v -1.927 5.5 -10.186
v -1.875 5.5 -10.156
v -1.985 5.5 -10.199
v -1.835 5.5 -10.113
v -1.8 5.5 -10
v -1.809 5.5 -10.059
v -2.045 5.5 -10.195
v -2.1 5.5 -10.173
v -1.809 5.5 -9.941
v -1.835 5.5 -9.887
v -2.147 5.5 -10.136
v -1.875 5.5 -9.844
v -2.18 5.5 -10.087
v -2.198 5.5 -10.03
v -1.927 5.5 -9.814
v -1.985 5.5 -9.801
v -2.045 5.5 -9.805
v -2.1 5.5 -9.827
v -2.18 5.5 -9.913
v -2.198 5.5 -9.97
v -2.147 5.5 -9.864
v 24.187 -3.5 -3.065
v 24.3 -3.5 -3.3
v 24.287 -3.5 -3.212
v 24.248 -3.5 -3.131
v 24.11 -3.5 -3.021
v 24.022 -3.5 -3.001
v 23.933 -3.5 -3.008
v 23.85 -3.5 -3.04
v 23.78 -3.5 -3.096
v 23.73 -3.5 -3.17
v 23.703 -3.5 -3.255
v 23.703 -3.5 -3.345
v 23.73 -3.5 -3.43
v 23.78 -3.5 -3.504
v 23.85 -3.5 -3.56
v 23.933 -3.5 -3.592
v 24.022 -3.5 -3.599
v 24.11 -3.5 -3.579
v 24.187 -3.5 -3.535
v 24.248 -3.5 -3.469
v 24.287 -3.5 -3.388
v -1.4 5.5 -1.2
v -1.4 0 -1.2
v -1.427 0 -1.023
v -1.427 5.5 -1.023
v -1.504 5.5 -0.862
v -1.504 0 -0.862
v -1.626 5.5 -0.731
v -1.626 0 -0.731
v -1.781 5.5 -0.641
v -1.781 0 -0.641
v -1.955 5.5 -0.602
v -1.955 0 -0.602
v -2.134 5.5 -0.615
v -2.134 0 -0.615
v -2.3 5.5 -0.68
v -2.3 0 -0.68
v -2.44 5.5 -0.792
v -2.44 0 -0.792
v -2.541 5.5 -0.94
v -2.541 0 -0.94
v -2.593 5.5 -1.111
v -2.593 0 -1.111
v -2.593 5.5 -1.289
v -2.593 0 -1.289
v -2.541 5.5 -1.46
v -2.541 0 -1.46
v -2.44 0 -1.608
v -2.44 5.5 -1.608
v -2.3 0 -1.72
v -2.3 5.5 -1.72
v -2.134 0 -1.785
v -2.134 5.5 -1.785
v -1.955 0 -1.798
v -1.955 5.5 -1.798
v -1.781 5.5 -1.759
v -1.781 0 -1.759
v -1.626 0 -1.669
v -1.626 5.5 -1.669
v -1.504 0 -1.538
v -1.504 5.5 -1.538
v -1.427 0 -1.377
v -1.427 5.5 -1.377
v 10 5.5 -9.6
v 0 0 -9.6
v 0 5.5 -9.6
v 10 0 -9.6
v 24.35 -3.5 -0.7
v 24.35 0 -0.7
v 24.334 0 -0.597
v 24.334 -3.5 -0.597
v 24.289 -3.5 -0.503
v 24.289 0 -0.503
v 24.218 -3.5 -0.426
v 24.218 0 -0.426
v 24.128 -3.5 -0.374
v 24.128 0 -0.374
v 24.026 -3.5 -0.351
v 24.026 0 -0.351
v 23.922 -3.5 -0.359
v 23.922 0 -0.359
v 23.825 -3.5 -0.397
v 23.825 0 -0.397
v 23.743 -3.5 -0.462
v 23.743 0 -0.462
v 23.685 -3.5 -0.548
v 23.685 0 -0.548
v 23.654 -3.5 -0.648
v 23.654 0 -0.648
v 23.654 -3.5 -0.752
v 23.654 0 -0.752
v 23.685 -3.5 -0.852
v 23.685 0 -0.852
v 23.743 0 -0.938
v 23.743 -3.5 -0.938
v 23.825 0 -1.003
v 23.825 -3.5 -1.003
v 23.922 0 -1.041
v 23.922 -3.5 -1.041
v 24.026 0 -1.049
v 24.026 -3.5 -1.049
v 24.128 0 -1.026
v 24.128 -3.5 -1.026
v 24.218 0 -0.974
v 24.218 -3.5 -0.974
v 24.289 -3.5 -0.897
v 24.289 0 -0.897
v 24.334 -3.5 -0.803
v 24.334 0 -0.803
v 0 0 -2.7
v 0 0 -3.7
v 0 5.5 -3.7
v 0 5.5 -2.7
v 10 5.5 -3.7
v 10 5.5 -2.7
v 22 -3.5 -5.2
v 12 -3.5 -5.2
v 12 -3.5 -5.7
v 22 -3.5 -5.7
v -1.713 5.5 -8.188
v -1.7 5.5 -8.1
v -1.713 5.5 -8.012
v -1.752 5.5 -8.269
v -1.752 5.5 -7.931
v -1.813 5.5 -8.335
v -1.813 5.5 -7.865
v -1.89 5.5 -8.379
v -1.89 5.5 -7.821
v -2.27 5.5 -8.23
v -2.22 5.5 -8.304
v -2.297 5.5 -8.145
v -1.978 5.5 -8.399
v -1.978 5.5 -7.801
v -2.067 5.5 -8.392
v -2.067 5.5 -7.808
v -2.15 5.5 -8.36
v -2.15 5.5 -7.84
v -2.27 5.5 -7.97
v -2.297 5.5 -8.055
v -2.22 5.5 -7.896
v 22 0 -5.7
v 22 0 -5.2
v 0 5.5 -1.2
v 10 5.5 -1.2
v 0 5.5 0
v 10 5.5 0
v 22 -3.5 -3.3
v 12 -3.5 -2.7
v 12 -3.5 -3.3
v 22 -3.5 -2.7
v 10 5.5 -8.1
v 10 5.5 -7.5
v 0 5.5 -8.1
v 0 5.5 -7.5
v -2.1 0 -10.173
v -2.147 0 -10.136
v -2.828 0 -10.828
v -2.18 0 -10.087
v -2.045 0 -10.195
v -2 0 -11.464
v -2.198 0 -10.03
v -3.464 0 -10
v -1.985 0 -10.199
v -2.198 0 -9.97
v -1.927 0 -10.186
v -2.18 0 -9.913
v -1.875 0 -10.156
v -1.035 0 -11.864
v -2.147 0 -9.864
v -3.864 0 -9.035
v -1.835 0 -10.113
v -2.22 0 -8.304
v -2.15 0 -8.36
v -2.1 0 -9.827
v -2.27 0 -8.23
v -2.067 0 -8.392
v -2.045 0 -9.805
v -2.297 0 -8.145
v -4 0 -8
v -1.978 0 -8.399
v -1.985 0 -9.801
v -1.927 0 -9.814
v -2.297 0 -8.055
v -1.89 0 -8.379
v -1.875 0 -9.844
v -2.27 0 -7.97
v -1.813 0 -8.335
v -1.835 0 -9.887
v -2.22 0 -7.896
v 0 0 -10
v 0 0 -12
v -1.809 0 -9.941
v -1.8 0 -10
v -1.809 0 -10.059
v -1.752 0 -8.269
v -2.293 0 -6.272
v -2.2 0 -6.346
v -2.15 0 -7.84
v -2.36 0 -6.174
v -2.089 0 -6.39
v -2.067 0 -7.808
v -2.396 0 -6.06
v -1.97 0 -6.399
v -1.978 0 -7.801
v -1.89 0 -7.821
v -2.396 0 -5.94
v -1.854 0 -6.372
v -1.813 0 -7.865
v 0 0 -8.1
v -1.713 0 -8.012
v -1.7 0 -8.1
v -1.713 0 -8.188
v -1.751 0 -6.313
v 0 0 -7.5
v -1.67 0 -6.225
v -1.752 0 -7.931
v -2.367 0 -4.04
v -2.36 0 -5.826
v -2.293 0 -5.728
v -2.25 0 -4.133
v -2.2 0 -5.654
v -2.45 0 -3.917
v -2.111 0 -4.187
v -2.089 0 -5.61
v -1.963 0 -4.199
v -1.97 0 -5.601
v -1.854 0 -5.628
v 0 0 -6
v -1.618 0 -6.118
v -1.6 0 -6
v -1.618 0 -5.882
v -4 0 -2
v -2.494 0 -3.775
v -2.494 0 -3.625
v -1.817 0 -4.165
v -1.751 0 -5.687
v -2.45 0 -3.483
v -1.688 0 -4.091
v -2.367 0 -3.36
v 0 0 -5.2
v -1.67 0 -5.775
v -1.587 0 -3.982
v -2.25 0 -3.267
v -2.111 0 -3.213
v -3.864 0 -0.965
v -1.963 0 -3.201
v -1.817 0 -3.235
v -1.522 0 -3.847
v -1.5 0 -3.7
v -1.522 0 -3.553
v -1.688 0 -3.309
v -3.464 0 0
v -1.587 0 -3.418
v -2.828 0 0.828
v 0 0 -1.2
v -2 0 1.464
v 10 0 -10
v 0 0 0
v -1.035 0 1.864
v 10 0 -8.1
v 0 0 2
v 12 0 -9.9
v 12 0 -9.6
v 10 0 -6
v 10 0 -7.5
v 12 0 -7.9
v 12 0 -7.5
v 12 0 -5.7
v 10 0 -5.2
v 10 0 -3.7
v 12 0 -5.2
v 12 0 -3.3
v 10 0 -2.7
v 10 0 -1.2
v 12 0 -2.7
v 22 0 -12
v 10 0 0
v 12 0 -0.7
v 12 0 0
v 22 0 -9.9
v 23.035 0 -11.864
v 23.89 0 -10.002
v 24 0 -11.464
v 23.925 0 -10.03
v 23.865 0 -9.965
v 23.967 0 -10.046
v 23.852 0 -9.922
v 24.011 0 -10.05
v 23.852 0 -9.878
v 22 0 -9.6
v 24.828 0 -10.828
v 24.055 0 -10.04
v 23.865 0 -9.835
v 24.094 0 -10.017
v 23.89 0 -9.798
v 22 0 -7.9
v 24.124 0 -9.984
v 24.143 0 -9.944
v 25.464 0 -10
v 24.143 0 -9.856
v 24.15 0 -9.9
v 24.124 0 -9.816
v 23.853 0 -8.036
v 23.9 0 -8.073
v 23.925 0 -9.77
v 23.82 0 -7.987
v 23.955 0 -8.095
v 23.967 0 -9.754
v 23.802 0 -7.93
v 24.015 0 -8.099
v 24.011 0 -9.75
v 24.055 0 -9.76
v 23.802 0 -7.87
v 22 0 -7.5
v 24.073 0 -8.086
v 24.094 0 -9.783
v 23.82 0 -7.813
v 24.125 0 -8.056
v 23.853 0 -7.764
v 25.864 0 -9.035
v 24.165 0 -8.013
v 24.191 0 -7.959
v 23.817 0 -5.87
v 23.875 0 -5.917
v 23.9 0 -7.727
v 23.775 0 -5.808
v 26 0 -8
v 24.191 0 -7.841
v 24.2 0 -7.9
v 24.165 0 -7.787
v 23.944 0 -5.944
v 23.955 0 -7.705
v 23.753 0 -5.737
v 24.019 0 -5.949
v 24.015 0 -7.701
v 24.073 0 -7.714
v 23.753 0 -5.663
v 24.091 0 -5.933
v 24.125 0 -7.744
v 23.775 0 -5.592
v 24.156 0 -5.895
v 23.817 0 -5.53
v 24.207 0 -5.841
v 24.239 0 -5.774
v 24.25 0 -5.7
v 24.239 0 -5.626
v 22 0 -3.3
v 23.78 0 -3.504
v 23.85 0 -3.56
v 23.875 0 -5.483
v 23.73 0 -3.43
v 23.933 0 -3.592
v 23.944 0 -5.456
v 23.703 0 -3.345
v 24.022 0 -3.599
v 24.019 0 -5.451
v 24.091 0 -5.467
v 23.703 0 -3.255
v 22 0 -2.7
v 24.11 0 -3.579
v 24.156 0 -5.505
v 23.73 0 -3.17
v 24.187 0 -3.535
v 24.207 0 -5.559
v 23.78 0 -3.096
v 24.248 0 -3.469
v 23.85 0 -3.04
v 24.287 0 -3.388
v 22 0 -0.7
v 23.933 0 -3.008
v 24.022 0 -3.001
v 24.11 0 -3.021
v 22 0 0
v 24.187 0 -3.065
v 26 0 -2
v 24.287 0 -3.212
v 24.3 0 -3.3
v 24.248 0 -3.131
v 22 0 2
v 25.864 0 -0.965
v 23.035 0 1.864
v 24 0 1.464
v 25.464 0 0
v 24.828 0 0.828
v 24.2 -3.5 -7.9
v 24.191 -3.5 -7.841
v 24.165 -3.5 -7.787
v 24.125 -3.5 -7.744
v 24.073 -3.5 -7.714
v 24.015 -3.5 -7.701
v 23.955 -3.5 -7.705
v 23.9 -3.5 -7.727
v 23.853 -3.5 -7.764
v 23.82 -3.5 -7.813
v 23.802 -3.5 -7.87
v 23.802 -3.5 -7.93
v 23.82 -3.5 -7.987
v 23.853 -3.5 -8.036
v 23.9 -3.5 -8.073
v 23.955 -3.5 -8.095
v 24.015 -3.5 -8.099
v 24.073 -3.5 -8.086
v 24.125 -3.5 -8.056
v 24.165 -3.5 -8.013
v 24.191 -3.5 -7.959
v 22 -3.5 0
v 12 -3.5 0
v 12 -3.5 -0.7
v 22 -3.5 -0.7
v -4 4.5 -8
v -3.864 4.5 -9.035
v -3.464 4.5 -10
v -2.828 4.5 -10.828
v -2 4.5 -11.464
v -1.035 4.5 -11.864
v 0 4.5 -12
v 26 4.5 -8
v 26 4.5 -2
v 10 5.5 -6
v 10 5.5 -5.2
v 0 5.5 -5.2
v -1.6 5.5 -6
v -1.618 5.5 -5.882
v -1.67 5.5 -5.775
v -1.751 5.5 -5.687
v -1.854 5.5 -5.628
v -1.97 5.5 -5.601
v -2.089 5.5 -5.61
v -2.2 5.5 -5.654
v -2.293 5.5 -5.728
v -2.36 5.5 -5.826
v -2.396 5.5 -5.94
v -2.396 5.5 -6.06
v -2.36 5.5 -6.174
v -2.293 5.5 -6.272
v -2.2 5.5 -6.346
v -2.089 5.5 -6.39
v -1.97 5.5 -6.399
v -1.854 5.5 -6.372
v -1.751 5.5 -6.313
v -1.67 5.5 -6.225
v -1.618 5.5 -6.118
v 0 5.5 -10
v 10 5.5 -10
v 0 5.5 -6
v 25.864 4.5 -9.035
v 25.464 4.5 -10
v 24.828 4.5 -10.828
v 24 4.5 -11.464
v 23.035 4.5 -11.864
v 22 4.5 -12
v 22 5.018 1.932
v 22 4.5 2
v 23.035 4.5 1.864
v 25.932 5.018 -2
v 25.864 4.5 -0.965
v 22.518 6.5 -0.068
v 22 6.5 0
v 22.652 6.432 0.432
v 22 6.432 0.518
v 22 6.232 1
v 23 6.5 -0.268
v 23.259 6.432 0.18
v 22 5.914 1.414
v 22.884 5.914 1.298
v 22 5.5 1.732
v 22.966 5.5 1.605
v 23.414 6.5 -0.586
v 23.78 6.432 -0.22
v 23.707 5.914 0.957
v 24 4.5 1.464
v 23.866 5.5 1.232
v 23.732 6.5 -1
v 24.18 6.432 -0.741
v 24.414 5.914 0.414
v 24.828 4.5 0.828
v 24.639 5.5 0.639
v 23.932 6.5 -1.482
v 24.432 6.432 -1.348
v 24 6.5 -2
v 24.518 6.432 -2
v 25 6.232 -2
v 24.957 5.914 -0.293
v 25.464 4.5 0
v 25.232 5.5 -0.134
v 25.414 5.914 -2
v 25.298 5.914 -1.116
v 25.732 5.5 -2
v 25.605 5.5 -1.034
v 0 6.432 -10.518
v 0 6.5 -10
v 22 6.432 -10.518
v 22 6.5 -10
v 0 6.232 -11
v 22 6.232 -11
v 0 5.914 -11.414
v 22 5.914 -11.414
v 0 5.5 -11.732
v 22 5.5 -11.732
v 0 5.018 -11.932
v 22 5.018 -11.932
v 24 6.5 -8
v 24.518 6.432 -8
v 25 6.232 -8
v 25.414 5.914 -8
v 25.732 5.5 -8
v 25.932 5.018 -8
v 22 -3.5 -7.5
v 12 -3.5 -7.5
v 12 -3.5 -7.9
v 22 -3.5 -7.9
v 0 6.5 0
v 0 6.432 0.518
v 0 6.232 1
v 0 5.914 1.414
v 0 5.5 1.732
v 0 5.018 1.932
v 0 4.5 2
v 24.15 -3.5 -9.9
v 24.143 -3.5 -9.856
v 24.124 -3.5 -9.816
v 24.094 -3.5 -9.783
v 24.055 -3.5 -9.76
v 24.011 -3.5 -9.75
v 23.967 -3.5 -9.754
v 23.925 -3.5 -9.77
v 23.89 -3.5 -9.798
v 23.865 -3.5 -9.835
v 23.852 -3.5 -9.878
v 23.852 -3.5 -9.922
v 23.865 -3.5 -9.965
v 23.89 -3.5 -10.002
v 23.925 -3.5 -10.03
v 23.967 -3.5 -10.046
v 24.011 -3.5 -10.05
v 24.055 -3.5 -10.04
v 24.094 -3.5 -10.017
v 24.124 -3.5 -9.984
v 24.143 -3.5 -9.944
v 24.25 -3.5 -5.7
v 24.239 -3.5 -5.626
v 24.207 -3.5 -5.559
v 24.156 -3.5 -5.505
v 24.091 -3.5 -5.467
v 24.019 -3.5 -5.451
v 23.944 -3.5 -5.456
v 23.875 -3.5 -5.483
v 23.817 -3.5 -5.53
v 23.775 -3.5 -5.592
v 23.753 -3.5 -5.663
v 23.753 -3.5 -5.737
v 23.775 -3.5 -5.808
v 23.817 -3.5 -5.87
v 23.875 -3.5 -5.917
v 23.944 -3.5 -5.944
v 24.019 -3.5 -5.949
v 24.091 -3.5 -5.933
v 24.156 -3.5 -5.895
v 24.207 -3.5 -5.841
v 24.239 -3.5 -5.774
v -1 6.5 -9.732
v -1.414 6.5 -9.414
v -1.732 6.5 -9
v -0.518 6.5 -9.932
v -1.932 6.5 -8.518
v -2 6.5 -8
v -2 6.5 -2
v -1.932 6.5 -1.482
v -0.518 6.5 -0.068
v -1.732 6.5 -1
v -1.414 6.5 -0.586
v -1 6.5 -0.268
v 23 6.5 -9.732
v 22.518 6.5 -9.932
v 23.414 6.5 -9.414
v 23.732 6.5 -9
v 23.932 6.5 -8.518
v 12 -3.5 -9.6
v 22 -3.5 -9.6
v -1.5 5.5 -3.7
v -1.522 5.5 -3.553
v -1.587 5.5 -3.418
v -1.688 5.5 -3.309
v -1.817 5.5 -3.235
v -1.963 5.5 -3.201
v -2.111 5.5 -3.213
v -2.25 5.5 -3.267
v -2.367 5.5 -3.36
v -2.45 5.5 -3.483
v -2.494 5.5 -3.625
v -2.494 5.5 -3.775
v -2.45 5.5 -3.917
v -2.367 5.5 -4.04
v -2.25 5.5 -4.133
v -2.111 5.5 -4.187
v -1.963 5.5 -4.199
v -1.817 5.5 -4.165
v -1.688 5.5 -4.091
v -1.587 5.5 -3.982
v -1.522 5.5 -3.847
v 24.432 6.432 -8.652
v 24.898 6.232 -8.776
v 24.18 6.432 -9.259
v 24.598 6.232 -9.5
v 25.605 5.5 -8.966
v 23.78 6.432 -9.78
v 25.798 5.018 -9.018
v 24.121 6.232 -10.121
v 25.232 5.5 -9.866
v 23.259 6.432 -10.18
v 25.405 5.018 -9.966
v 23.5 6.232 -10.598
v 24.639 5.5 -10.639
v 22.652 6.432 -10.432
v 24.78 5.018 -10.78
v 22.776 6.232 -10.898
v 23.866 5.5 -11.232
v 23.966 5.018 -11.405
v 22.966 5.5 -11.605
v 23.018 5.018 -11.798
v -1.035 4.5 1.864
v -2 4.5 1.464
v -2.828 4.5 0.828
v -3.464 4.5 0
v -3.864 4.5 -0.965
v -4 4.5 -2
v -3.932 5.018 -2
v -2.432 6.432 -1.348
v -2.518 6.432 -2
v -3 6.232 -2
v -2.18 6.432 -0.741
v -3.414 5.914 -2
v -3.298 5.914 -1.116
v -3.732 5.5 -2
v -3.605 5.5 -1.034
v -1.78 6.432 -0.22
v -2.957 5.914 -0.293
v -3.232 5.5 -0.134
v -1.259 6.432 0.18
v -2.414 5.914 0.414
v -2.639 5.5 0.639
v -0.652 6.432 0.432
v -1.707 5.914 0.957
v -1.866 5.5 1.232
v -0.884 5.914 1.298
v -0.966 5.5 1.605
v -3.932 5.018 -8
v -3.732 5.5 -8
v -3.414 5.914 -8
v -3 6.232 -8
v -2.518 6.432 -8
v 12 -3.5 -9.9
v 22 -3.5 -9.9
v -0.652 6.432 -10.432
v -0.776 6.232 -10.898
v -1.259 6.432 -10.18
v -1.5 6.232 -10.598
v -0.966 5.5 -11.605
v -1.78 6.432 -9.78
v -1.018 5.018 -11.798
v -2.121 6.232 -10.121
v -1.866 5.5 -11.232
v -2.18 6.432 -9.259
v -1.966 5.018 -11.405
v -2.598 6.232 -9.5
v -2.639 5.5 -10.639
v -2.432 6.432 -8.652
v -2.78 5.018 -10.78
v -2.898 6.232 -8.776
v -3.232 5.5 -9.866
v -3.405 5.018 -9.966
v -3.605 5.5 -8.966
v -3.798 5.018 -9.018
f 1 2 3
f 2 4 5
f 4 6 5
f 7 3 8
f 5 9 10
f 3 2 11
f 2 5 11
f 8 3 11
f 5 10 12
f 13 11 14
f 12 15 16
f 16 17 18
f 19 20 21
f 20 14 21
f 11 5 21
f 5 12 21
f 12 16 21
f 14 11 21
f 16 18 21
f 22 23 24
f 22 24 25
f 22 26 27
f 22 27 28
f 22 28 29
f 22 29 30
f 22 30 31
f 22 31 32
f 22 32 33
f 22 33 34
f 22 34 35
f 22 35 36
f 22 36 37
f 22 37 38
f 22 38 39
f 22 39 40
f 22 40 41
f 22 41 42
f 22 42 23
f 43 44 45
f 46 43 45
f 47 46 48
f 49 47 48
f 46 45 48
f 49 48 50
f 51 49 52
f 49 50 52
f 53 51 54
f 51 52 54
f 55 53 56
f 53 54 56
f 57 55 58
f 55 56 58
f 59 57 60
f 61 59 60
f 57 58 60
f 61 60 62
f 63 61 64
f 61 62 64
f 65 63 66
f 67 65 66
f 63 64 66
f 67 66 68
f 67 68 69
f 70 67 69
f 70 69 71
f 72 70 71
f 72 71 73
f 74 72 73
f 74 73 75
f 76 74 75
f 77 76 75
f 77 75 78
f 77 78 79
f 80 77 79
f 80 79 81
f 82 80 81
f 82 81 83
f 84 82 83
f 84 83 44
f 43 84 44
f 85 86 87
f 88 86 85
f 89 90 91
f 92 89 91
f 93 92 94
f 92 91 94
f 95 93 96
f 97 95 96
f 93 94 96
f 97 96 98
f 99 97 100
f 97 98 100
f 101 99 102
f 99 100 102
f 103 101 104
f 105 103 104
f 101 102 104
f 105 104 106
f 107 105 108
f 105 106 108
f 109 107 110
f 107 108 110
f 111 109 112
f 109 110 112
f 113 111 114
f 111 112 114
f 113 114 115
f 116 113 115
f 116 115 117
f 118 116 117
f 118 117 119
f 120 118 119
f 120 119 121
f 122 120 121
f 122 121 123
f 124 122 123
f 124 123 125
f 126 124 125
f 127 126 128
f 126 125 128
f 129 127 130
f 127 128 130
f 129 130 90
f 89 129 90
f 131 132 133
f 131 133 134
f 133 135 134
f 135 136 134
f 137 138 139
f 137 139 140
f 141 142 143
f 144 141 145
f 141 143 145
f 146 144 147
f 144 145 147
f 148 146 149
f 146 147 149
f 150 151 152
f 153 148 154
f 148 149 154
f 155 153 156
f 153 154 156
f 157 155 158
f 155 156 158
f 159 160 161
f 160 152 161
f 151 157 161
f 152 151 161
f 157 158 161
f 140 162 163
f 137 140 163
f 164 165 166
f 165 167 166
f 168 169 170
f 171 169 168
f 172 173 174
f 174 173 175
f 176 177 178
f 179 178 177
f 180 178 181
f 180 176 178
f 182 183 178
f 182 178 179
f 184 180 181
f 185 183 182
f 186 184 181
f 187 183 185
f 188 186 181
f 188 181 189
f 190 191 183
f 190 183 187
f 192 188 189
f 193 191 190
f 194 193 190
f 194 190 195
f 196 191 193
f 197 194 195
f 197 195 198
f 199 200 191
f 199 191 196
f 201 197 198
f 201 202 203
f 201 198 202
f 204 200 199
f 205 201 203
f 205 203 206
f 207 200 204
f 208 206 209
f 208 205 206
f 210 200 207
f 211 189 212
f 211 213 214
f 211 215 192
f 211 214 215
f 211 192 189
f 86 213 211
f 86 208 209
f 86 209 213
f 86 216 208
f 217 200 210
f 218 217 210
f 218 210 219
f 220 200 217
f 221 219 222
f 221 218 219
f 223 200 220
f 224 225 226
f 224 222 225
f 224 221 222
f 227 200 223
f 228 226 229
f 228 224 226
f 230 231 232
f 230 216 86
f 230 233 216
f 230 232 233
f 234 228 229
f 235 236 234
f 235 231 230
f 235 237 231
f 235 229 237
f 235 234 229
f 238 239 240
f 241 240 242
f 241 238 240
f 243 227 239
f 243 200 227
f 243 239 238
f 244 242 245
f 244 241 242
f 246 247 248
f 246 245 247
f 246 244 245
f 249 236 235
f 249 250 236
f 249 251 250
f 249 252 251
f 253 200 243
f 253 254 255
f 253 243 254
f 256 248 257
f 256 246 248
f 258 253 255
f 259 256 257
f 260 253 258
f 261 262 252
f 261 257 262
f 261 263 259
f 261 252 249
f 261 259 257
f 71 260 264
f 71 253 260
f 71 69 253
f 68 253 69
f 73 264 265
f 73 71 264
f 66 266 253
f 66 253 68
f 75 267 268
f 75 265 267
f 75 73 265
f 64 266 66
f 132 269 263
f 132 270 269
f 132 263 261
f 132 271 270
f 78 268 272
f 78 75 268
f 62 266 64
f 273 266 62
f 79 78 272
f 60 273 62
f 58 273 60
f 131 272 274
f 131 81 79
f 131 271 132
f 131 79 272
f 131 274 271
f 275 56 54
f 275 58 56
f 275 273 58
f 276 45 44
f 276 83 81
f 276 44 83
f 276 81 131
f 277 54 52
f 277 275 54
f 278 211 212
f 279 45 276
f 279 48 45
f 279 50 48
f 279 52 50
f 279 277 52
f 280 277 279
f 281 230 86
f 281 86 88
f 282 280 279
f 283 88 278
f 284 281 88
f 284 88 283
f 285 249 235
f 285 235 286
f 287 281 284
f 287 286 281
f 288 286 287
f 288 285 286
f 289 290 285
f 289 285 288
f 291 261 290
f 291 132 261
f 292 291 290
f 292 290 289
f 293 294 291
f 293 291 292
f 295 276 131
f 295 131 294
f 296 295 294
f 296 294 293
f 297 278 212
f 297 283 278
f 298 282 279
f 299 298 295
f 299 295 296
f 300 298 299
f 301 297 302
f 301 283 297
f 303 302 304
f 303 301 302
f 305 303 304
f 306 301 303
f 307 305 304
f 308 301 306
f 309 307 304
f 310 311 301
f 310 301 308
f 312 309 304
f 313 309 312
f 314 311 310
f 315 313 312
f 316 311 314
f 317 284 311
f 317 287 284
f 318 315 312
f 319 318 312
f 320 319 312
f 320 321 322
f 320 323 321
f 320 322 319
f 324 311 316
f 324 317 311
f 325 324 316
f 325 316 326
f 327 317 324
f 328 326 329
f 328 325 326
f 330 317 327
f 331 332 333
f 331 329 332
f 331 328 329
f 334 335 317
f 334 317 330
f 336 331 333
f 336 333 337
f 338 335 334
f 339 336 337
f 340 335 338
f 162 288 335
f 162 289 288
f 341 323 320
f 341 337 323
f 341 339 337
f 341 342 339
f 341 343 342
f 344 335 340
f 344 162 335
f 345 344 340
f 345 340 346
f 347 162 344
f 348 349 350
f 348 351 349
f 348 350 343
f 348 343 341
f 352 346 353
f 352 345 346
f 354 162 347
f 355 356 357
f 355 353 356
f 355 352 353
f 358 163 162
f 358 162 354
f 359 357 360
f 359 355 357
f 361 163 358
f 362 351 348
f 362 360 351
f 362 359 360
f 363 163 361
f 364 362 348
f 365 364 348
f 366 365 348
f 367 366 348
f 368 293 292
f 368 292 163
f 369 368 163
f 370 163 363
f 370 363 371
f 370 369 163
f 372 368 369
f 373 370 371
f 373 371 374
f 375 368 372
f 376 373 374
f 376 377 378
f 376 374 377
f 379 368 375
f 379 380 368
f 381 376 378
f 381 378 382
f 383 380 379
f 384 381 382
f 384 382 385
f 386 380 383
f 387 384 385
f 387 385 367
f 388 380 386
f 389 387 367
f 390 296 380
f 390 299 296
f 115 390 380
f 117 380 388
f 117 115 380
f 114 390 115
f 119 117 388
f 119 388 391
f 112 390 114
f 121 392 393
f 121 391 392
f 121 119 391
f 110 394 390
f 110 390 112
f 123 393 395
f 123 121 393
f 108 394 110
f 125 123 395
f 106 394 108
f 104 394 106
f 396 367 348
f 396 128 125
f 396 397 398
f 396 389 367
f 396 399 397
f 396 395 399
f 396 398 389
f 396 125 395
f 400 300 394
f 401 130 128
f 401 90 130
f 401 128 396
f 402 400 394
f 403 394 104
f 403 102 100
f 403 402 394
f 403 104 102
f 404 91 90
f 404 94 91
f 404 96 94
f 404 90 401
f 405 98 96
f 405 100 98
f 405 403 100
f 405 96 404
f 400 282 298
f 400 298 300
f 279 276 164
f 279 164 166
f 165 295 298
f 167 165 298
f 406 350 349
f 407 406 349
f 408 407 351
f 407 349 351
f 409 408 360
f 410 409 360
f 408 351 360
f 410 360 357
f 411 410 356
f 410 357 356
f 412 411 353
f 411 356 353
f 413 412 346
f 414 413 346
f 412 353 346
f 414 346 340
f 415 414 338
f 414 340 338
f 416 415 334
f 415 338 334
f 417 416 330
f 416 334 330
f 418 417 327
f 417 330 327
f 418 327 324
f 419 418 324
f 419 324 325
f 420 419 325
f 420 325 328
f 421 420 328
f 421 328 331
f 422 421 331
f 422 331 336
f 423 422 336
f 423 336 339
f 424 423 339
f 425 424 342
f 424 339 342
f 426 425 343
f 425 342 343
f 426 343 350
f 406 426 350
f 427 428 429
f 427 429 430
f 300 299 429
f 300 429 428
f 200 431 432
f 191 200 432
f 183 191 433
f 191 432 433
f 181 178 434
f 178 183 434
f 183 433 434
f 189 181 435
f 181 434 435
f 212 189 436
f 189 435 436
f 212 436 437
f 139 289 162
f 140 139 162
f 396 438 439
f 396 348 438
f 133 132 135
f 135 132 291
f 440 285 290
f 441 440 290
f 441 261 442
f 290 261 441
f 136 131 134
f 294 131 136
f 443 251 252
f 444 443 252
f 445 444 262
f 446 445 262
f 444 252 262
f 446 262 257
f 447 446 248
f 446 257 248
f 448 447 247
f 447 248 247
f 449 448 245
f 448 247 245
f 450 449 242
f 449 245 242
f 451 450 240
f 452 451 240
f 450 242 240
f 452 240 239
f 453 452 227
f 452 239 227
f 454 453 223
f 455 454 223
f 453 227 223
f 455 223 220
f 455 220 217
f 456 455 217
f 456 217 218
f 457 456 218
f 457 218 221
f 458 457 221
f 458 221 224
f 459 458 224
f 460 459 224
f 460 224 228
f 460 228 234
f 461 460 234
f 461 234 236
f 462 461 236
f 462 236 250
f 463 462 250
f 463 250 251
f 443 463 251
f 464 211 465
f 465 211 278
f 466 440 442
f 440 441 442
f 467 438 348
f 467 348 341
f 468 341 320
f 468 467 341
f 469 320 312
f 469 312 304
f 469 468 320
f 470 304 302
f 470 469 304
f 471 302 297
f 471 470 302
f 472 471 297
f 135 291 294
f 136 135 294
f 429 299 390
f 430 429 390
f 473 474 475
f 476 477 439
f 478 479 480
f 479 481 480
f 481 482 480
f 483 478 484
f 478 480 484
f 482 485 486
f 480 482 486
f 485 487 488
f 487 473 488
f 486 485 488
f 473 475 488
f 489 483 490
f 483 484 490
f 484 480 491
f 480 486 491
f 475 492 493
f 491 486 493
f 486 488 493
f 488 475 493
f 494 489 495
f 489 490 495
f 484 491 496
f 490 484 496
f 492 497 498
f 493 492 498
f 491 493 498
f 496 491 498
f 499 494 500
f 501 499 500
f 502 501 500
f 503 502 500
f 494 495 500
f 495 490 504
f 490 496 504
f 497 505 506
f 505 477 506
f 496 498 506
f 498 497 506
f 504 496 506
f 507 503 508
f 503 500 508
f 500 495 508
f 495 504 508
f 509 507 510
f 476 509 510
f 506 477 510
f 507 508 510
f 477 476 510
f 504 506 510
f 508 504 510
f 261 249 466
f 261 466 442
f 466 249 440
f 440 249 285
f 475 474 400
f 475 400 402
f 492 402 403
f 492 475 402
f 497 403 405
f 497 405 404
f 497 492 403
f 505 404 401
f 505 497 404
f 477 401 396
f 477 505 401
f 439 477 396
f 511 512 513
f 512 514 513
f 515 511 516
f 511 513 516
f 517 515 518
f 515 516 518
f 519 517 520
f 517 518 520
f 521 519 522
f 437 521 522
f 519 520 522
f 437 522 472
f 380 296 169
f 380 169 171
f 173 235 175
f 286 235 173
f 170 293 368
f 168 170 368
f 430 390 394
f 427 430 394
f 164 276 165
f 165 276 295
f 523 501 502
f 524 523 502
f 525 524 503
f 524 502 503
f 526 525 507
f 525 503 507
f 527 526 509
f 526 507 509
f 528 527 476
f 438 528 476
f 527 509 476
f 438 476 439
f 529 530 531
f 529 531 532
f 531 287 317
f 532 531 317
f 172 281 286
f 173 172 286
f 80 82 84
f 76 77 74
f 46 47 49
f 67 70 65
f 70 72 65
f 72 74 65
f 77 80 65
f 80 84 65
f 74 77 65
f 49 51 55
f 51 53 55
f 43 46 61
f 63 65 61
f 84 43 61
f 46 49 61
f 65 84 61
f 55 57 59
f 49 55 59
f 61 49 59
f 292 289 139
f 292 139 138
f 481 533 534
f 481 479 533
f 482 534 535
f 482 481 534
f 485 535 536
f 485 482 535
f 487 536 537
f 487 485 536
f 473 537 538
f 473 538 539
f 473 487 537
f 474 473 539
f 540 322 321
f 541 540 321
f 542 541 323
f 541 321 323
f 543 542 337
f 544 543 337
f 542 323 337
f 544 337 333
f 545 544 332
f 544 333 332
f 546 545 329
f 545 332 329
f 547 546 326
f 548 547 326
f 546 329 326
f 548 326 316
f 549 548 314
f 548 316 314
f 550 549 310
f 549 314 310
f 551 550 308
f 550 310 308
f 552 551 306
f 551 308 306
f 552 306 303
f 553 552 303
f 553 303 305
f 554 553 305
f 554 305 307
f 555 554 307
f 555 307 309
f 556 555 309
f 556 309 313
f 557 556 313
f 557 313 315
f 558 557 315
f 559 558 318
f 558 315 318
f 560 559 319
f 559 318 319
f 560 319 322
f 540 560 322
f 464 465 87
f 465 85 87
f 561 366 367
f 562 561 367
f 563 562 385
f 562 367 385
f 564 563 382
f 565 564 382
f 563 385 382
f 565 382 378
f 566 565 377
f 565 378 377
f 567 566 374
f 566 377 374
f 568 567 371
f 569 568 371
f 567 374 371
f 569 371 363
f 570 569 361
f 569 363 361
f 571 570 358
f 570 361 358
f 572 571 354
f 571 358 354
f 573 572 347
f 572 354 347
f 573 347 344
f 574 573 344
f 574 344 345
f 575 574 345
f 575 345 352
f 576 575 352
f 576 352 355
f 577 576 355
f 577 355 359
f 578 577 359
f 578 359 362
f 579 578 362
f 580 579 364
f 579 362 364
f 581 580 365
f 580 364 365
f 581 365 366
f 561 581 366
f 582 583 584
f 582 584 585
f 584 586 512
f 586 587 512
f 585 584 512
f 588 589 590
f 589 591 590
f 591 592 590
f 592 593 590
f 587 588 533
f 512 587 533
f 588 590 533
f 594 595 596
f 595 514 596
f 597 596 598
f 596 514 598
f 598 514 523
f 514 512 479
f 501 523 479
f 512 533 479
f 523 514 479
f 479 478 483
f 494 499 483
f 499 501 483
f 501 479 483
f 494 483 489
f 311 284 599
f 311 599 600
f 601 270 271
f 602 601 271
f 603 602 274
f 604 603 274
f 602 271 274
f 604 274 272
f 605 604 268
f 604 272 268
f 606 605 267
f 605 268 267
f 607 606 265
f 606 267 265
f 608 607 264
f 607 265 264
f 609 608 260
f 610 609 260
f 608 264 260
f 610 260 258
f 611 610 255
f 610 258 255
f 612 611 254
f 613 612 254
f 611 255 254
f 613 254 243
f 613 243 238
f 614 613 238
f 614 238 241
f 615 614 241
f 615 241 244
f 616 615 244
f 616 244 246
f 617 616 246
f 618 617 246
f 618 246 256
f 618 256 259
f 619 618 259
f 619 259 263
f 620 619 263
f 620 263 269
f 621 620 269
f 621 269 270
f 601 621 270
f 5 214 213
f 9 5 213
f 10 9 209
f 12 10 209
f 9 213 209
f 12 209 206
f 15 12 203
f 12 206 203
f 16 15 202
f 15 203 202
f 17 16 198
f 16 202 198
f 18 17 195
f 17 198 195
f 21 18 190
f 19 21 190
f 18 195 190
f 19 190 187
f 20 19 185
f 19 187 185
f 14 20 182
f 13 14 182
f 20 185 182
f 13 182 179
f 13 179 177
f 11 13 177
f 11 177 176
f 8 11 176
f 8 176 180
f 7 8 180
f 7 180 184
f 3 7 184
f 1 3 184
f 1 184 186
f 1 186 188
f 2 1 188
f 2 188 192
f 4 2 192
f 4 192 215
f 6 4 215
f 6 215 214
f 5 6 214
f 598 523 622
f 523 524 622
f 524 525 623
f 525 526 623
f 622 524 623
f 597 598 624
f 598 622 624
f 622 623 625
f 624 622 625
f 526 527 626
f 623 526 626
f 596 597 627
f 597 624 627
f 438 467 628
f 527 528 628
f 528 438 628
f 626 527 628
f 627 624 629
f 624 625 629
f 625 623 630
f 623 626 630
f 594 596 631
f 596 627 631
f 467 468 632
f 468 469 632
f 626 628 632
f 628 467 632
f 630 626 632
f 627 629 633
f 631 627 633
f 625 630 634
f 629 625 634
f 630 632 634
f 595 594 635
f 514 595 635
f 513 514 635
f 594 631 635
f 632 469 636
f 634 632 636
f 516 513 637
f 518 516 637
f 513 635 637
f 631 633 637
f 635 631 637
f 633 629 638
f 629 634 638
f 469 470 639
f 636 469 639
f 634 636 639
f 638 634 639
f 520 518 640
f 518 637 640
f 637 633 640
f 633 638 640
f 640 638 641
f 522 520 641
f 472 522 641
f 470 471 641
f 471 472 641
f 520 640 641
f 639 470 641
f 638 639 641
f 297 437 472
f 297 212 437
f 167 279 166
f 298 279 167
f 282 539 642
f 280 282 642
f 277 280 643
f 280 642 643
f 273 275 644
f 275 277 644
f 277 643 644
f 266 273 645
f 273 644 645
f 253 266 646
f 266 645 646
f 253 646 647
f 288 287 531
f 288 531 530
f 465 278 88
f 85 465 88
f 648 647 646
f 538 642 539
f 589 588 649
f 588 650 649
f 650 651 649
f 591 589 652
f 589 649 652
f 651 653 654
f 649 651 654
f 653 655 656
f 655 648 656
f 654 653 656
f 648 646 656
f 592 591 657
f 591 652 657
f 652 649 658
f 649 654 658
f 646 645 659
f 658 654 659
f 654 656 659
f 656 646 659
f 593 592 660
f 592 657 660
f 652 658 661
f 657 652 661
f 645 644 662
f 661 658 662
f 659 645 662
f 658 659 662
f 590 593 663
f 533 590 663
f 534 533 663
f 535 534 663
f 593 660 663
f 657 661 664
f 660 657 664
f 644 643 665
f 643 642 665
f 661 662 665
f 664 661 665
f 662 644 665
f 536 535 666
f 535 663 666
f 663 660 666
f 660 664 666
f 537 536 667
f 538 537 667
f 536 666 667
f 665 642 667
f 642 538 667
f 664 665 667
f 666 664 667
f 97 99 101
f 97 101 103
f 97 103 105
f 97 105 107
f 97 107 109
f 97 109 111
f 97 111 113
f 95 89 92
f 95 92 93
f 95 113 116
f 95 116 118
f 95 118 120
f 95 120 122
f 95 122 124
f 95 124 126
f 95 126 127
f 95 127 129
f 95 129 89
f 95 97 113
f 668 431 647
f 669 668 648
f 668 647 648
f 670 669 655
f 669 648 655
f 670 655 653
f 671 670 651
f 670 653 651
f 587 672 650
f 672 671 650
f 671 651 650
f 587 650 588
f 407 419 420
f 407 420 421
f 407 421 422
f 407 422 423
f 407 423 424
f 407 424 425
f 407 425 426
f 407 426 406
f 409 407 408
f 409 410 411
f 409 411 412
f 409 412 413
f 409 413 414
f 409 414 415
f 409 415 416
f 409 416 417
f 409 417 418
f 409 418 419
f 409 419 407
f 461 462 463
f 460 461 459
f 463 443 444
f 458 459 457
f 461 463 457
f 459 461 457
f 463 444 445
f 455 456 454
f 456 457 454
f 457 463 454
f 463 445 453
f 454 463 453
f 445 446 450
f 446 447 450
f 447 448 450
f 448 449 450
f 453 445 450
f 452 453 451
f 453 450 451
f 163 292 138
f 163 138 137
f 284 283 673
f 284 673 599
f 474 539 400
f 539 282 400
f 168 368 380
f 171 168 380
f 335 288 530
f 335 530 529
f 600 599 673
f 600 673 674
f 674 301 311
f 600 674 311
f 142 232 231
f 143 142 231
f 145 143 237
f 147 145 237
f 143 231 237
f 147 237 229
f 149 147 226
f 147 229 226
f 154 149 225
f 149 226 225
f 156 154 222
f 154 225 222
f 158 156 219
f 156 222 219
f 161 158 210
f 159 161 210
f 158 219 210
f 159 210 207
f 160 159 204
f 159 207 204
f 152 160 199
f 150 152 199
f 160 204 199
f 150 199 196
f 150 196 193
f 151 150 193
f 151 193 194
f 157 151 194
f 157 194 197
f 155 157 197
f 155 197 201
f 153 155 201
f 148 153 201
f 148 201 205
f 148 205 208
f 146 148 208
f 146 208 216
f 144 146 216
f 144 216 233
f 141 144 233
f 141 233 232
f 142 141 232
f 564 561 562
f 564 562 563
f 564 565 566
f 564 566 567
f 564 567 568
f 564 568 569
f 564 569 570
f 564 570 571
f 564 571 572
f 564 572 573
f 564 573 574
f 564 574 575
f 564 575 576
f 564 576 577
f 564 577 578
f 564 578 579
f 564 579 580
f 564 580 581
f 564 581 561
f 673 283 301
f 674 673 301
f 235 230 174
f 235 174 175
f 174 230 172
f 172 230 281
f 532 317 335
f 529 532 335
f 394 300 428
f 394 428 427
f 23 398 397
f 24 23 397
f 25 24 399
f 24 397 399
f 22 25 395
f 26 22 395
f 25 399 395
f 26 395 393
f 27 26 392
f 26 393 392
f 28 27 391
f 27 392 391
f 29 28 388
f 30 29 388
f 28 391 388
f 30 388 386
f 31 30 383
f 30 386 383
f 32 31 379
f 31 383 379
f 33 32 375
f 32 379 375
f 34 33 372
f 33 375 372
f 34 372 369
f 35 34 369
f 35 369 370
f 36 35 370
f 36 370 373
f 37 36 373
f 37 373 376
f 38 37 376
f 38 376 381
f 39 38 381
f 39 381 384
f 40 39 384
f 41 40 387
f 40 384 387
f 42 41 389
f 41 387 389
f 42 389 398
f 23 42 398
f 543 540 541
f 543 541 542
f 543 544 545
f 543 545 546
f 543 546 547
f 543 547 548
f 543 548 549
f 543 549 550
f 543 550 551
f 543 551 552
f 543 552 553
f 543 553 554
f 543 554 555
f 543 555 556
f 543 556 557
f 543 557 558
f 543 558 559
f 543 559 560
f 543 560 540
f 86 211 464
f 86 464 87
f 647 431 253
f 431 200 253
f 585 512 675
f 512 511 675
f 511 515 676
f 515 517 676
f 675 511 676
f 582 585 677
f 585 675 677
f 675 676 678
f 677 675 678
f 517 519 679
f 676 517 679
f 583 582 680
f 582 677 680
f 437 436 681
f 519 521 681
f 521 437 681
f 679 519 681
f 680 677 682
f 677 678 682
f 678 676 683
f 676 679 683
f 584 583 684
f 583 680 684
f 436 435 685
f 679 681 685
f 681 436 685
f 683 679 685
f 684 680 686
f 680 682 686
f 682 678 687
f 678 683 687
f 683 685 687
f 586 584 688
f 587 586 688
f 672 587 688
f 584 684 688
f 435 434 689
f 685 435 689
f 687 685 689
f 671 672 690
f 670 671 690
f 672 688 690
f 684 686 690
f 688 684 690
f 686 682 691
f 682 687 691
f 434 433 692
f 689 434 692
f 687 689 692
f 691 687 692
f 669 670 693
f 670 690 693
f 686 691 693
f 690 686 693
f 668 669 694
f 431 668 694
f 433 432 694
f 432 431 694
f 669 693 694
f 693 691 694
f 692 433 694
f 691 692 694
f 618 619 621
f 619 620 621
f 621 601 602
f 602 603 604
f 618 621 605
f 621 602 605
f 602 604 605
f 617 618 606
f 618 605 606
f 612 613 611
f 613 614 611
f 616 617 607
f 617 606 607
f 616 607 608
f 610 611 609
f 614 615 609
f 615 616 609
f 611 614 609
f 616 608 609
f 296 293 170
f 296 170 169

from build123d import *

# Parameters (mm, degrees)
F0_W         = 30
F0_H         = 14
F0_R         = 0.2
F0_W_2       = 10
F0_H_2       = 0.4
F0_R_2       = 0.3
F0_R_3       = 0.4
F0_H_3       = 0.6
F0_H_4       = 0.8
F0_H_5       = 0.3
F0_R_4       = 0.15
F0_H_6       = 0.5
F0_R_5       = 0.25
F0_R_6       = 0.5
F0_H_7       = 1
F0_R_7       = 0.6
F0_H_8       = 1.2
F0_H_9       = 0.7
F0_R_8       = 0.35
F1_DEPTH     = 6.5
F2_DEPTH     = 3.5
F3_W         = 30
F3_H         = 14
F4_DEPTH     = 1
F5_R         = 2
F6_T1_DEPTH  = 16.5
F6_T4_ANGLE  = 90
F6_T6_ANGLE  = 90
F6_T8_ANGLE  = 90
F6_T10_ANGLE = 90


# Not quite as in the source:
# - a fillet or chamfer that OpenCascade refuses, or shapes differently, is made with other operations: its cross-section is extruded or revolved along the edge and cut away or added


with BuildPart() as f1:
    # F0 (on Front) → F1 (new body)
    with BuildSketch(Plane.XZ):
        with Locations((11, -5)):
            Rectangle(F0_W, F0_H)
        with Locations((-2, -10)):
            Circle(F0_R, mode=Mode.SUBTRACT)
        with Locations((5, -9.8)):
            Rectangle(F0_W_2, F0_H_2, mode=Mode.SUBTRACT)
        with Locations((-2, -8.1)):
            Circle(F0_R_2, mode=Mode.SUBTRACT)
        with Locations((-2, -6)):
            Circle(F0_R_3, mode=Mode.SUBTRACT)
        with Locations((5, -7.8)):
            Rectangle(F0_W_2, F0_H_3, mode=Mode.SUBTRACT)
        with Locations((5, -5.6)):
            Rectangle(F0_W_2, F0_H_4, mode=Mode.SUBTRACT)
        with Locations((17, -9.75)):
            Rectangle(F0_W_2, F0_H_5, mode=Mode.SUBTRACT)
        with Locations((24, -9.9)):
            Circle(F0_R_4, mode=Mode.SUBTRACT)
        with Locations((17, -7.7)):
            Rectangle(F0_W_2, F0_H_2, mode=Mode.SUBTRACT)
        with Locations((17, -5.45)):
            Rectangle(F0_W_2, F0_H_6, mode=Mode.SUBTRACT)
        with Locations((24, -7.9)):
            Circle(F0_R, mode=Mode.SUBTRACT)
        with Locations((24, -5.7)):
            Circle(F0_R_5, mode=Mode.SUBTRACT)
        with Locations((-2, -3.7)):
            Circle(F0_R_6, mode=Mode.SUBTRACT)
        with Locations((5, -3.2)):
            Rectangle(F0_W_2, F0_H_7, mode=Mode.SUBTRACT)
        with Locations((-2, -1.2)):
            Circle(F0_R_7, mode=Mode.SUBTRACT)
        with Locations((5, -0.6)):
            Rectangle(F0_W_2, F0_H_8, mode=Mode.SUBTRACT)
        with Locations((17, -3)):
            Rectangle(F0_W_2, F0_H_3, mode=Mode.SUBTRACT)
        with Locations((24, -3.3)):
            Circle(F0_R_2, mode=Mode.SUBTRACT)
        with Locations((17, -0.35)):
            Rectangle(F0_W_2, F0_H_9, mode=Mode.SUBTRACT)
        with Locations((24, -0.7)):
            Circle(F0_R_8, mode=Mode.SUBTRACT)
        with Locations((17, -0.35)):
            Rectangle(F0_W_2, F0_H_9)
        with Locations((17, -3)):
            Rectangle(F0_W_2, F0_H_3)
        with Locations((17, -5.45)):
            Rectangle(F0_W_2, F0_H_6)
        with Locations((17, -7.7)):
            Rectangle(F0_W_2, F0_H_2)
        with Locations((17, -9.75)):
            Rectangle(F0_W_2, F0_H_5)
        with Locations((24, -0.7)):
            Circle(F0_R_8)
        with Locations((24, -3.3)):
            Circle(F0_R_2)
        with Locations((24, -5.7)):
            Circle(F0_R_5)
        with Locations((24, -7.9)):
            Circle(F0_R)
        with Locations((24, -9.9)):
            Circle(F0_R_4)
    extrude(amount=-F1_DEPTH)

    # F0 (on Front) → F2 (join)
    with BuildSketch(Plane.XZ):
        with Locations((17, -0.35)):
            Rectangle(F0_W_2, F0_H_9)
        with Locations((17, -3)):
            Rectangle(F0_W_2, F0_H_3)
        with Locations((17, -5.45)):
            Rectangle(F0_W_2, F0_H_6)
        with Locations((17, -7.7)):
            Rectangle(F0_W_2, F0_H_2)
        with Locations((17, -9.75)):
            Rectangle(F0_W_2, F0_H_5)
        with Locations((24, -0.7)):
            Circle(F0_R_8)
        with Locations((24, -3.3)):
            Circle(F0_R_2)
        with Locations((24, -5.7)):
            Circle(F0_R_5)
        with Locations((24, -7.9)):
            Circle(F0_R)
        with Locations((24, -9.9)):
            Circle(F0_R_4)
    extrude(amount=F2_DEPTH)

    # F3 (on face) → F4 (join)
    with BuildSketch(Plane(origin=(0, 6.5, 0), x_dir=(-1, 0, 0), z_dir=(0, 1, 0))):
        with Locations((-11, -5)):
            Rectangle(F3_W, F3_H)
    extrude(amount=-F4_DEPTH)

    # F5
    f5_edges = [f1.edges().sort_by_distance(p)[0] for p in [
        (-4, 6.5, -5),
        (11, 6.5, -12),
        (26, 6.5, -5),
        (11, 6.5, 2),
    ]]
    fillet(f5_edges, radius=F5_R)

    # F6: fillet of radius 4 on 4 edges, made by hand

    # F6_s2 → F6_t1 (cut)
    with BuildSketch(Plane.XZ.offset(-6.5)):
        with BuildLine():
            ThreePointArc((-4, -8), (-2.8284271247, -10.8284271247), (0, -12))
            Line((0, -12), (-4, -12))
            Line((-4, -12), (-4, -8))
        make_face()
        with BuildLine():
            ThreePointArc((0, 2), (-2.8284271247, 0.8284271247), (-4, -2))
            Line((-4, -2), (-4, 2))
            Line((-4, 2), (0, 2))
        make_face()
        with BuildLine():
            ThreePointArc((26, -8), (24.8284271247, -10.8284271247), (22, -12))
            Line((22, -12), (26, -12))
            Line((26, -12), (26, -8))
        make_face()
        with BuildLine():
            ThreePointArc((22, 2), (24.8284271247, 0.8284271247), (26, -2))
            Line((26, -2), (26, 2))
            Line((26, 2), (22, 2))
        make_face()
    extrude(amount=F6_T1_DEPTH, mode=Mode.SUBTRACT)

    # F6_s3 → F6_t4 (revolve, cut)
    with BuildSketch(Plane.YZ.offset(22)):
        with BuildLine():
            ThreePointArc((6.5, 0), (5.9142135624, 1.4142135624), (4.5, 2))
            Line((4.5, 2), (6.5, 2))
            Line((6.5, 2), (6.5, 0))
        make_face()
    revolve(axis=Axis((22, 6.5, -2), (0, 1, 0)), revolution_arc=F6_T4_ANGLE, mode=Mode.SUBTRACT)

    # F6_s5 → F6_t6 (revolve, cut)
    with BuildSketch(Plane.XY.offset(-8)):
        with BuildLine():
            ThreePointArc((24, 6.5), (25.4142135624, 5.9142135624), (26, 4.5))
            Line((26, 4.5), (26, 6.5))
            Line((26, 6.5), (24, 6.5))
        make_face()
    revolve(axis=Axis((22, 6.5, -8), (0, 1, 0)), revolution_arc=F6_T6_ANGLE, mode=Mode.SUBTRACT)

    # F6_s7 → F6_t8 (revolve, cut)
    with BuildSketch(Plane.XY.offset(-2)):
        with BuildLine():
            ThreePointArc((-2, 6.5), (-3.4142135624, 5.9142135624), (-4, 4.5))
            Line((-4, 4.5), (-4, 6.5))
            Line((-4, 6.5), (-2, 6.5))
        make_face()
    revolve(axis=Axis((0, 6.5, -2), (0, 1, 0)), revolution_arc=F6_T8_ANGLE, mode=Mode.SUBTRACT)

    # F6_s9 → F6_t10 (revolve, cut)
    with BuildSketch(Plane.YZ):
        with BuildLine():
            ThreePointArc((6.5, -10), (5.9142135624, -11.4142135624), (4.5, -12))
            Line((4.5, -12), (6.5, -12))
            Line((6.5, -12), (6.5, -10))
        make_face()
    revolve(axis=Axis((0, 6.5, -8), (0, 1, 0)), revolution_arc=F6_T10_ANGLE, mode=Mode.SUBTRACT)


solid = f1.part
